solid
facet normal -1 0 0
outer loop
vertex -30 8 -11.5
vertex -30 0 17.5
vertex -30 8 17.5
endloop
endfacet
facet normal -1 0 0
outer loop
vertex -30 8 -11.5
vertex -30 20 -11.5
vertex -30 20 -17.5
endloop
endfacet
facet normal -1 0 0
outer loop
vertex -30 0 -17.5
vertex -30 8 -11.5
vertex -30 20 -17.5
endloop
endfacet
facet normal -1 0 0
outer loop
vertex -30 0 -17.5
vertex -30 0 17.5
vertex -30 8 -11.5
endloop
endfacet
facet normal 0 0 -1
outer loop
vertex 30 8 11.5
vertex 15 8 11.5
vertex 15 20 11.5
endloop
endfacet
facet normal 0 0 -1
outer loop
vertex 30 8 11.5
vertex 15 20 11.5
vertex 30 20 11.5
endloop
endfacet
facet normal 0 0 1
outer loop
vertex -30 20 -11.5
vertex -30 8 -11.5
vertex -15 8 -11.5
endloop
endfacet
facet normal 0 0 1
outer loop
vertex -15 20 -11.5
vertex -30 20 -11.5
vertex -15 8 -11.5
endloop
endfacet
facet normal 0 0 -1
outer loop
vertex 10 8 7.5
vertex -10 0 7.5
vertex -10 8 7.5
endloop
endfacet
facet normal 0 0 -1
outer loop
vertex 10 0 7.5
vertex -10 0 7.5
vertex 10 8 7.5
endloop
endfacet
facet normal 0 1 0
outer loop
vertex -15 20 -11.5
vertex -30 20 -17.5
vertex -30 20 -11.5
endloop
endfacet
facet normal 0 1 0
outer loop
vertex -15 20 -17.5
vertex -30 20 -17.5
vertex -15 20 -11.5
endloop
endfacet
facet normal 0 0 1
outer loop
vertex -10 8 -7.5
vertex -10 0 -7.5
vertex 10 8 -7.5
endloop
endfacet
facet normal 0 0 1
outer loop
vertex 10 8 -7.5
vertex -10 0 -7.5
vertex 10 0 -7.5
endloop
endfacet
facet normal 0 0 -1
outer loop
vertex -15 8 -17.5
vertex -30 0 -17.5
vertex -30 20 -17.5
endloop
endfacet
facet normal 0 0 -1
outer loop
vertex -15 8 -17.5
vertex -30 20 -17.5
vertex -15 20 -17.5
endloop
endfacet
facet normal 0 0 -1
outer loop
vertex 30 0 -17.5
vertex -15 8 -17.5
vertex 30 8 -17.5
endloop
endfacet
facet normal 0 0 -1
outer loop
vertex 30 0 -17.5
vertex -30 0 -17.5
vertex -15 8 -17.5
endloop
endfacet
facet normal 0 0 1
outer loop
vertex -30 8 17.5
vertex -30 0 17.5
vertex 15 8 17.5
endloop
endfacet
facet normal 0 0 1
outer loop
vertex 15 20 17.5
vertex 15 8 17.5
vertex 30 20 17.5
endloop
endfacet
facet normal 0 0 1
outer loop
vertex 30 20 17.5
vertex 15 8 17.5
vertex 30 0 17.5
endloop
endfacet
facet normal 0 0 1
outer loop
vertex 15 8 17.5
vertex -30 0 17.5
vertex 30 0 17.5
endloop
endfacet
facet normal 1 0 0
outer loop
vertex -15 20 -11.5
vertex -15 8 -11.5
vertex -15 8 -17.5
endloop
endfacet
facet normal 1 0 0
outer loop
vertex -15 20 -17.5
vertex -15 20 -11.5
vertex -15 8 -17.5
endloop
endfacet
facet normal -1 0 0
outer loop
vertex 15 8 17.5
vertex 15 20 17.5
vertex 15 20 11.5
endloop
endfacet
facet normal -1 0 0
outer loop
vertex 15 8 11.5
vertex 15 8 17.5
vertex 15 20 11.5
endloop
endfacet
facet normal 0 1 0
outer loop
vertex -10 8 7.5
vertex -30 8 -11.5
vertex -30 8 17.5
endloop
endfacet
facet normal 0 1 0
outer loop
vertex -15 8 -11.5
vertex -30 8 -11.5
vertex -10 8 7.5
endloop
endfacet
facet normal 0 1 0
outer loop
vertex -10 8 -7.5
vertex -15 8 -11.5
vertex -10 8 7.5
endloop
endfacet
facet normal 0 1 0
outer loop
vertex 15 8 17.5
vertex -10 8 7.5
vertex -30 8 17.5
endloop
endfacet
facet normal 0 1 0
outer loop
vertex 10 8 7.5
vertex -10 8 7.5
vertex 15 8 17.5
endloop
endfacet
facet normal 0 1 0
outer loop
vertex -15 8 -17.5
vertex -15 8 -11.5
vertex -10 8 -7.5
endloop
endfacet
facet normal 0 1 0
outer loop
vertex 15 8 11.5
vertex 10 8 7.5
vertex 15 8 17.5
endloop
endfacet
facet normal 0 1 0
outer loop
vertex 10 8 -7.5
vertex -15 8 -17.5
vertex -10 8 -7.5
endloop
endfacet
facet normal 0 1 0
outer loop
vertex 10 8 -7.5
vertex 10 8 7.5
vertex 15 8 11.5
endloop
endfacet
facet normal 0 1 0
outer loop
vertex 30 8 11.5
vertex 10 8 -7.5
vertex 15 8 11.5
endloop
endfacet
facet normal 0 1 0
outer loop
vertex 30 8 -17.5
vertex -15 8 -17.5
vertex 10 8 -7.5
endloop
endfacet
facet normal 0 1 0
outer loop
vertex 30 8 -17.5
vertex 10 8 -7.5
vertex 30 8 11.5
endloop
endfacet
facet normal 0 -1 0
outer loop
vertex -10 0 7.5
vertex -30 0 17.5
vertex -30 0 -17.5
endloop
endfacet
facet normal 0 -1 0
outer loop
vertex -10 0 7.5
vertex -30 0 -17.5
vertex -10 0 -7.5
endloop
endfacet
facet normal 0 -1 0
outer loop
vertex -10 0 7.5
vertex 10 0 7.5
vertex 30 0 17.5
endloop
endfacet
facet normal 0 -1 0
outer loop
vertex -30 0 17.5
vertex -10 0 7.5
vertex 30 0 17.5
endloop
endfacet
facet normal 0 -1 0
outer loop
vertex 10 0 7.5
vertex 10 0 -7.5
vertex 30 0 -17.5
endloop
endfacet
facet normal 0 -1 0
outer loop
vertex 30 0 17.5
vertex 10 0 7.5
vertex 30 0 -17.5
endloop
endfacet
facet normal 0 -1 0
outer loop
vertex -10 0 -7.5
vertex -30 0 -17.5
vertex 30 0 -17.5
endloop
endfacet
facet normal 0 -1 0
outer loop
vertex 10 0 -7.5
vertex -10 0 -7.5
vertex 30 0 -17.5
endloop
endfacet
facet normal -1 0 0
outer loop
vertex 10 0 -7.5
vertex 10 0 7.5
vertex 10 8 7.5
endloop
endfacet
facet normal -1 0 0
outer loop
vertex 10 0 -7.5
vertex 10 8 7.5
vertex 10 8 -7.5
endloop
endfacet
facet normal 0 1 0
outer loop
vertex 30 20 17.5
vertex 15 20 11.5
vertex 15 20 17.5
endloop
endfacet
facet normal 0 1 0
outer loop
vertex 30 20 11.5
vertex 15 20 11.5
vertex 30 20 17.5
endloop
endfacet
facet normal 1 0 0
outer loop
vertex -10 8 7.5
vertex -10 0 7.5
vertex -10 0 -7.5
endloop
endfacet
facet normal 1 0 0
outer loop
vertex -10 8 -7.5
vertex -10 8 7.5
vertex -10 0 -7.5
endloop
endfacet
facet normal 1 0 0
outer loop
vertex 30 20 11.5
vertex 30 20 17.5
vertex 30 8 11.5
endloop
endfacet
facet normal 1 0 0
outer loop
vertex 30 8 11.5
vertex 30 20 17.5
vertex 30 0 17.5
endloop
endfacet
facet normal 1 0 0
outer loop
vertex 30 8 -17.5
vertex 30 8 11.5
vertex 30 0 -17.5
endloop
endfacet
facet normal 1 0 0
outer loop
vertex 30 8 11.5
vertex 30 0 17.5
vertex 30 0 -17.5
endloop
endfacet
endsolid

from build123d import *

# Parameters (mm, degrees)
SKETCH1_W           = 60
SKETCH1_H           = 35
BOSS_EXTRUDE1_DEPTH = 8
SKETCH2_W           = 15
SKETCH2_H           = 6
BOSS_EXTRUDE2_DEPTH = 20
SKETCH3_W           = 20
SKETCH3_H           = 15
CUT_EXTRUDE2_DEPTH  = 41.078048855


with BuildPart() as part:
    # Sketch1 → Boss-Extrude1 (new body)
    with BuildSketch(Plane(origin=(0, 0, 0), x_dir=(1, 0, 0), z_dir=(0, 1, 0))):
        Rectangle(SKETCH1_W, SKETCH1_H)
    extrude(amount=BOSS_EXTRUDE1_DEPTH)

    # Sketch2 → Boss-Extrude2 (add)
    with BuildSketch(Plane(origin=(0, 0, 0), x_dir=(1, 0, 0), z_dir=(0, 1, 0))):
        with Locations((-22.5, 14.5)):
            Rectangle(SKETCH2_W, SKETCH2_H)
        with Locations((22.5, -14.5)):
            Rectangle(SKETCH2_W, SKETCH2_H)
    extrude(amount=BOSS_EXTRUDE2_DEPTH)

    # Sketch3 → Cut-Extrude2 (cut, through all)
    with BuildSketch(Plane(origin=(0, 0, 0), x_dir=(1, 0, 0), z_dir=(0, 1, 0))):
        Rectangle(SKETCH3_W, SKETCH3_H)
    extrude(amount=CUT_EXTRUDE2_DEPTH, mode=Mode.SUBTRACT)


solid = part.part
